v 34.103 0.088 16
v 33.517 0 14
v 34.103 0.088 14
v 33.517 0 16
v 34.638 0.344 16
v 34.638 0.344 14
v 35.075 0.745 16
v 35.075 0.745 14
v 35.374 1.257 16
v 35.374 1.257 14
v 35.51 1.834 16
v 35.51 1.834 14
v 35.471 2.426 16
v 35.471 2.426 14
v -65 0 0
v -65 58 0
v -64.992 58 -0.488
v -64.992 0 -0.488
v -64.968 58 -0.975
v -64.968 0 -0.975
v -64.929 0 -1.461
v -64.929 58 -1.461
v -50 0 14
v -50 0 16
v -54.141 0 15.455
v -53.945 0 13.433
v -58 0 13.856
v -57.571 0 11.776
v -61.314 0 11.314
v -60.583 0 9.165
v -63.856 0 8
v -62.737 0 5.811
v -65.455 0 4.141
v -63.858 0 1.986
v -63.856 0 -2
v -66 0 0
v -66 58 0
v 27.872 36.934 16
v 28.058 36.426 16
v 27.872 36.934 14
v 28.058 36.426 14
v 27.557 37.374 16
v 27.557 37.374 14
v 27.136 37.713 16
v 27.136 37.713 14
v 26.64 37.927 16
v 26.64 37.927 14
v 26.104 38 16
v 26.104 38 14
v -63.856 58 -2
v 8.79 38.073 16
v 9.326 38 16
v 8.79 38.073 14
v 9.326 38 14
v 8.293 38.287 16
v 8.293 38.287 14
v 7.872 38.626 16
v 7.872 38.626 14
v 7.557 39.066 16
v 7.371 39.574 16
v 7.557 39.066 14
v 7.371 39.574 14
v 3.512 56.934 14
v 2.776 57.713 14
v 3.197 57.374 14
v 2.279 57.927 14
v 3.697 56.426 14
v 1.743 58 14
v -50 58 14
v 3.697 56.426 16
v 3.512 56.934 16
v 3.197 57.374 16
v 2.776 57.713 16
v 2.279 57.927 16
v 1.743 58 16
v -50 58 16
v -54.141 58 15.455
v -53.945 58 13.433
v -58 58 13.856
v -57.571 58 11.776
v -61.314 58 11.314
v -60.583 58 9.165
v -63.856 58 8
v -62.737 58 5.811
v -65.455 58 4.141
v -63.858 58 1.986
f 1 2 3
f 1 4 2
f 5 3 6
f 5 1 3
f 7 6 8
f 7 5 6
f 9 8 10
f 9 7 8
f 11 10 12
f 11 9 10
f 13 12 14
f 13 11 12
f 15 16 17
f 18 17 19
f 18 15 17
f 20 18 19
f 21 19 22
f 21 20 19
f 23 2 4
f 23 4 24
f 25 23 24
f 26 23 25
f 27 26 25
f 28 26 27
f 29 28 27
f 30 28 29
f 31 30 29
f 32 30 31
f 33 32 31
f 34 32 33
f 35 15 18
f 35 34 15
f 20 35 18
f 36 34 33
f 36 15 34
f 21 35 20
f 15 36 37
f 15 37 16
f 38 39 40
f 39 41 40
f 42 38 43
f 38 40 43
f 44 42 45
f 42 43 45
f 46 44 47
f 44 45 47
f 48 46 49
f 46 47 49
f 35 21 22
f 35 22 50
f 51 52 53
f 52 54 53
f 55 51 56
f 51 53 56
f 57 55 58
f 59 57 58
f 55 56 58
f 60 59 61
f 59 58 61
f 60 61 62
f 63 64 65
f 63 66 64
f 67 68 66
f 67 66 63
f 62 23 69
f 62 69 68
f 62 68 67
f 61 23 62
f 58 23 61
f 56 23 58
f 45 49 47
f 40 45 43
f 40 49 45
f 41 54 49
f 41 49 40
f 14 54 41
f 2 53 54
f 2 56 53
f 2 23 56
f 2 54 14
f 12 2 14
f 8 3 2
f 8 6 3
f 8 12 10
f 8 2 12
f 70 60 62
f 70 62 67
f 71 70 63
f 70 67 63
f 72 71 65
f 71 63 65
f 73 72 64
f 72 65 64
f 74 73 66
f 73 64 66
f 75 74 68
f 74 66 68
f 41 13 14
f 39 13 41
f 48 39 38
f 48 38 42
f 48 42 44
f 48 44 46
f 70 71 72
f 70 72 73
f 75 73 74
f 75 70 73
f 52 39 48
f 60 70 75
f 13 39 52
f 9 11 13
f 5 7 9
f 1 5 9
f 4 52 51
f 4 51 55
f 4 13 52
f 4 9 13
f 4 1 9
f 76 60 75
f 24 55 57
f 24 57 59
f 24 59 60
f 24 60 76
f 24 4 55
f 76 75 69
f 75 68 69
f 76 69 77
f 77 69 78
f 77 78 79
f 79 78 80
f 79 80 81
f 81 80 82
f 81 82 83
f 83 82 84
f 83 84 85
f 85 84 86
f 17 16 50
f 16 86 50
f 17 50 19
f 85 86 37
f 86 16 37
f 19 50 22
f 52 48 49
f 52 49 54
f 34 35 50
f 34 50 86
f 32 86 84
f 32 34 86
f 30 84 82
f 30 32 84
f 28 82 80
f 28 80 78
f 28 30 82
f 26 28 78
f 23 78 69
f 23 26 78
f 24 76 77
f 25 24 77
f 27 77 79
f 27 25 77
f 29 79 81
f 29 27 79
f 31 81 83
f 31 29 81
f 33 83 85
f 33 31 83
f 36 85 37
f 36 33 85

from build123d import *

# Parameters (mm, degrees)
BOSS_EXTRUDE1_DEPTH = 58
CUT_EXTRUDE1_DEPTH  = 90.688349299
FILLET1_R           = 2


with BuildPart() as part:
    # Sketch1 → Boss-Extrude1 (new body)
    with BuildSketch(Plane(origin=(0, 0, 0), x_dir=(1, 0, 0), z_dir=(0, 1, 0))):
        with BuildLine():
            Line((-50, -14), (36, -14))
            Line((36, -14), (36, -16))
            Line((36, -16), (-50, -16))
            ThreePointArc((-50, -16), (-61.313708499, -11.313708499), (-66, 0))
            Line((-66, 0), (-65, 0))
            ThreePointArc((-65, 0), (-64.982153791, 0.731483276), (-64.928657629, 1.461225992))
            Line((-64.928657629, 1.461225992), (-63.856406461, 2))
            ThreePointArc((-63.856406461, 2), (-60.583005244, -9.16515139), (-50, -14))
        make_face()
    extrude(amount=BOSS_EXTRUDE1_DEPTH)

    # Sketch2 → Cut-Extrude1 (cut, through all)
    with BuildSketch(Plane.XY.offset(16)):
        Polygon((36, 0), (27.714660104, 38), (7.714660104, 38), (3.353954895, 58), (36, 58), align=None)
    extrude(amount=-CUT_EXTRUDE1_DEPTH, mode=Mode.SUBTRACT)

    # Fillet1
    fillet1_edges = [part.edges().sort_by_distance(p)[0] for p in [
        (3.353954895, 58, 15),
        (27.714660104, 38, 15),
        (7.714660104, 38, 15),
        (36, 0, 15),
    ]]
    fillet(fillet1_edges, radius=FILLET1_R)


solid = part.part
